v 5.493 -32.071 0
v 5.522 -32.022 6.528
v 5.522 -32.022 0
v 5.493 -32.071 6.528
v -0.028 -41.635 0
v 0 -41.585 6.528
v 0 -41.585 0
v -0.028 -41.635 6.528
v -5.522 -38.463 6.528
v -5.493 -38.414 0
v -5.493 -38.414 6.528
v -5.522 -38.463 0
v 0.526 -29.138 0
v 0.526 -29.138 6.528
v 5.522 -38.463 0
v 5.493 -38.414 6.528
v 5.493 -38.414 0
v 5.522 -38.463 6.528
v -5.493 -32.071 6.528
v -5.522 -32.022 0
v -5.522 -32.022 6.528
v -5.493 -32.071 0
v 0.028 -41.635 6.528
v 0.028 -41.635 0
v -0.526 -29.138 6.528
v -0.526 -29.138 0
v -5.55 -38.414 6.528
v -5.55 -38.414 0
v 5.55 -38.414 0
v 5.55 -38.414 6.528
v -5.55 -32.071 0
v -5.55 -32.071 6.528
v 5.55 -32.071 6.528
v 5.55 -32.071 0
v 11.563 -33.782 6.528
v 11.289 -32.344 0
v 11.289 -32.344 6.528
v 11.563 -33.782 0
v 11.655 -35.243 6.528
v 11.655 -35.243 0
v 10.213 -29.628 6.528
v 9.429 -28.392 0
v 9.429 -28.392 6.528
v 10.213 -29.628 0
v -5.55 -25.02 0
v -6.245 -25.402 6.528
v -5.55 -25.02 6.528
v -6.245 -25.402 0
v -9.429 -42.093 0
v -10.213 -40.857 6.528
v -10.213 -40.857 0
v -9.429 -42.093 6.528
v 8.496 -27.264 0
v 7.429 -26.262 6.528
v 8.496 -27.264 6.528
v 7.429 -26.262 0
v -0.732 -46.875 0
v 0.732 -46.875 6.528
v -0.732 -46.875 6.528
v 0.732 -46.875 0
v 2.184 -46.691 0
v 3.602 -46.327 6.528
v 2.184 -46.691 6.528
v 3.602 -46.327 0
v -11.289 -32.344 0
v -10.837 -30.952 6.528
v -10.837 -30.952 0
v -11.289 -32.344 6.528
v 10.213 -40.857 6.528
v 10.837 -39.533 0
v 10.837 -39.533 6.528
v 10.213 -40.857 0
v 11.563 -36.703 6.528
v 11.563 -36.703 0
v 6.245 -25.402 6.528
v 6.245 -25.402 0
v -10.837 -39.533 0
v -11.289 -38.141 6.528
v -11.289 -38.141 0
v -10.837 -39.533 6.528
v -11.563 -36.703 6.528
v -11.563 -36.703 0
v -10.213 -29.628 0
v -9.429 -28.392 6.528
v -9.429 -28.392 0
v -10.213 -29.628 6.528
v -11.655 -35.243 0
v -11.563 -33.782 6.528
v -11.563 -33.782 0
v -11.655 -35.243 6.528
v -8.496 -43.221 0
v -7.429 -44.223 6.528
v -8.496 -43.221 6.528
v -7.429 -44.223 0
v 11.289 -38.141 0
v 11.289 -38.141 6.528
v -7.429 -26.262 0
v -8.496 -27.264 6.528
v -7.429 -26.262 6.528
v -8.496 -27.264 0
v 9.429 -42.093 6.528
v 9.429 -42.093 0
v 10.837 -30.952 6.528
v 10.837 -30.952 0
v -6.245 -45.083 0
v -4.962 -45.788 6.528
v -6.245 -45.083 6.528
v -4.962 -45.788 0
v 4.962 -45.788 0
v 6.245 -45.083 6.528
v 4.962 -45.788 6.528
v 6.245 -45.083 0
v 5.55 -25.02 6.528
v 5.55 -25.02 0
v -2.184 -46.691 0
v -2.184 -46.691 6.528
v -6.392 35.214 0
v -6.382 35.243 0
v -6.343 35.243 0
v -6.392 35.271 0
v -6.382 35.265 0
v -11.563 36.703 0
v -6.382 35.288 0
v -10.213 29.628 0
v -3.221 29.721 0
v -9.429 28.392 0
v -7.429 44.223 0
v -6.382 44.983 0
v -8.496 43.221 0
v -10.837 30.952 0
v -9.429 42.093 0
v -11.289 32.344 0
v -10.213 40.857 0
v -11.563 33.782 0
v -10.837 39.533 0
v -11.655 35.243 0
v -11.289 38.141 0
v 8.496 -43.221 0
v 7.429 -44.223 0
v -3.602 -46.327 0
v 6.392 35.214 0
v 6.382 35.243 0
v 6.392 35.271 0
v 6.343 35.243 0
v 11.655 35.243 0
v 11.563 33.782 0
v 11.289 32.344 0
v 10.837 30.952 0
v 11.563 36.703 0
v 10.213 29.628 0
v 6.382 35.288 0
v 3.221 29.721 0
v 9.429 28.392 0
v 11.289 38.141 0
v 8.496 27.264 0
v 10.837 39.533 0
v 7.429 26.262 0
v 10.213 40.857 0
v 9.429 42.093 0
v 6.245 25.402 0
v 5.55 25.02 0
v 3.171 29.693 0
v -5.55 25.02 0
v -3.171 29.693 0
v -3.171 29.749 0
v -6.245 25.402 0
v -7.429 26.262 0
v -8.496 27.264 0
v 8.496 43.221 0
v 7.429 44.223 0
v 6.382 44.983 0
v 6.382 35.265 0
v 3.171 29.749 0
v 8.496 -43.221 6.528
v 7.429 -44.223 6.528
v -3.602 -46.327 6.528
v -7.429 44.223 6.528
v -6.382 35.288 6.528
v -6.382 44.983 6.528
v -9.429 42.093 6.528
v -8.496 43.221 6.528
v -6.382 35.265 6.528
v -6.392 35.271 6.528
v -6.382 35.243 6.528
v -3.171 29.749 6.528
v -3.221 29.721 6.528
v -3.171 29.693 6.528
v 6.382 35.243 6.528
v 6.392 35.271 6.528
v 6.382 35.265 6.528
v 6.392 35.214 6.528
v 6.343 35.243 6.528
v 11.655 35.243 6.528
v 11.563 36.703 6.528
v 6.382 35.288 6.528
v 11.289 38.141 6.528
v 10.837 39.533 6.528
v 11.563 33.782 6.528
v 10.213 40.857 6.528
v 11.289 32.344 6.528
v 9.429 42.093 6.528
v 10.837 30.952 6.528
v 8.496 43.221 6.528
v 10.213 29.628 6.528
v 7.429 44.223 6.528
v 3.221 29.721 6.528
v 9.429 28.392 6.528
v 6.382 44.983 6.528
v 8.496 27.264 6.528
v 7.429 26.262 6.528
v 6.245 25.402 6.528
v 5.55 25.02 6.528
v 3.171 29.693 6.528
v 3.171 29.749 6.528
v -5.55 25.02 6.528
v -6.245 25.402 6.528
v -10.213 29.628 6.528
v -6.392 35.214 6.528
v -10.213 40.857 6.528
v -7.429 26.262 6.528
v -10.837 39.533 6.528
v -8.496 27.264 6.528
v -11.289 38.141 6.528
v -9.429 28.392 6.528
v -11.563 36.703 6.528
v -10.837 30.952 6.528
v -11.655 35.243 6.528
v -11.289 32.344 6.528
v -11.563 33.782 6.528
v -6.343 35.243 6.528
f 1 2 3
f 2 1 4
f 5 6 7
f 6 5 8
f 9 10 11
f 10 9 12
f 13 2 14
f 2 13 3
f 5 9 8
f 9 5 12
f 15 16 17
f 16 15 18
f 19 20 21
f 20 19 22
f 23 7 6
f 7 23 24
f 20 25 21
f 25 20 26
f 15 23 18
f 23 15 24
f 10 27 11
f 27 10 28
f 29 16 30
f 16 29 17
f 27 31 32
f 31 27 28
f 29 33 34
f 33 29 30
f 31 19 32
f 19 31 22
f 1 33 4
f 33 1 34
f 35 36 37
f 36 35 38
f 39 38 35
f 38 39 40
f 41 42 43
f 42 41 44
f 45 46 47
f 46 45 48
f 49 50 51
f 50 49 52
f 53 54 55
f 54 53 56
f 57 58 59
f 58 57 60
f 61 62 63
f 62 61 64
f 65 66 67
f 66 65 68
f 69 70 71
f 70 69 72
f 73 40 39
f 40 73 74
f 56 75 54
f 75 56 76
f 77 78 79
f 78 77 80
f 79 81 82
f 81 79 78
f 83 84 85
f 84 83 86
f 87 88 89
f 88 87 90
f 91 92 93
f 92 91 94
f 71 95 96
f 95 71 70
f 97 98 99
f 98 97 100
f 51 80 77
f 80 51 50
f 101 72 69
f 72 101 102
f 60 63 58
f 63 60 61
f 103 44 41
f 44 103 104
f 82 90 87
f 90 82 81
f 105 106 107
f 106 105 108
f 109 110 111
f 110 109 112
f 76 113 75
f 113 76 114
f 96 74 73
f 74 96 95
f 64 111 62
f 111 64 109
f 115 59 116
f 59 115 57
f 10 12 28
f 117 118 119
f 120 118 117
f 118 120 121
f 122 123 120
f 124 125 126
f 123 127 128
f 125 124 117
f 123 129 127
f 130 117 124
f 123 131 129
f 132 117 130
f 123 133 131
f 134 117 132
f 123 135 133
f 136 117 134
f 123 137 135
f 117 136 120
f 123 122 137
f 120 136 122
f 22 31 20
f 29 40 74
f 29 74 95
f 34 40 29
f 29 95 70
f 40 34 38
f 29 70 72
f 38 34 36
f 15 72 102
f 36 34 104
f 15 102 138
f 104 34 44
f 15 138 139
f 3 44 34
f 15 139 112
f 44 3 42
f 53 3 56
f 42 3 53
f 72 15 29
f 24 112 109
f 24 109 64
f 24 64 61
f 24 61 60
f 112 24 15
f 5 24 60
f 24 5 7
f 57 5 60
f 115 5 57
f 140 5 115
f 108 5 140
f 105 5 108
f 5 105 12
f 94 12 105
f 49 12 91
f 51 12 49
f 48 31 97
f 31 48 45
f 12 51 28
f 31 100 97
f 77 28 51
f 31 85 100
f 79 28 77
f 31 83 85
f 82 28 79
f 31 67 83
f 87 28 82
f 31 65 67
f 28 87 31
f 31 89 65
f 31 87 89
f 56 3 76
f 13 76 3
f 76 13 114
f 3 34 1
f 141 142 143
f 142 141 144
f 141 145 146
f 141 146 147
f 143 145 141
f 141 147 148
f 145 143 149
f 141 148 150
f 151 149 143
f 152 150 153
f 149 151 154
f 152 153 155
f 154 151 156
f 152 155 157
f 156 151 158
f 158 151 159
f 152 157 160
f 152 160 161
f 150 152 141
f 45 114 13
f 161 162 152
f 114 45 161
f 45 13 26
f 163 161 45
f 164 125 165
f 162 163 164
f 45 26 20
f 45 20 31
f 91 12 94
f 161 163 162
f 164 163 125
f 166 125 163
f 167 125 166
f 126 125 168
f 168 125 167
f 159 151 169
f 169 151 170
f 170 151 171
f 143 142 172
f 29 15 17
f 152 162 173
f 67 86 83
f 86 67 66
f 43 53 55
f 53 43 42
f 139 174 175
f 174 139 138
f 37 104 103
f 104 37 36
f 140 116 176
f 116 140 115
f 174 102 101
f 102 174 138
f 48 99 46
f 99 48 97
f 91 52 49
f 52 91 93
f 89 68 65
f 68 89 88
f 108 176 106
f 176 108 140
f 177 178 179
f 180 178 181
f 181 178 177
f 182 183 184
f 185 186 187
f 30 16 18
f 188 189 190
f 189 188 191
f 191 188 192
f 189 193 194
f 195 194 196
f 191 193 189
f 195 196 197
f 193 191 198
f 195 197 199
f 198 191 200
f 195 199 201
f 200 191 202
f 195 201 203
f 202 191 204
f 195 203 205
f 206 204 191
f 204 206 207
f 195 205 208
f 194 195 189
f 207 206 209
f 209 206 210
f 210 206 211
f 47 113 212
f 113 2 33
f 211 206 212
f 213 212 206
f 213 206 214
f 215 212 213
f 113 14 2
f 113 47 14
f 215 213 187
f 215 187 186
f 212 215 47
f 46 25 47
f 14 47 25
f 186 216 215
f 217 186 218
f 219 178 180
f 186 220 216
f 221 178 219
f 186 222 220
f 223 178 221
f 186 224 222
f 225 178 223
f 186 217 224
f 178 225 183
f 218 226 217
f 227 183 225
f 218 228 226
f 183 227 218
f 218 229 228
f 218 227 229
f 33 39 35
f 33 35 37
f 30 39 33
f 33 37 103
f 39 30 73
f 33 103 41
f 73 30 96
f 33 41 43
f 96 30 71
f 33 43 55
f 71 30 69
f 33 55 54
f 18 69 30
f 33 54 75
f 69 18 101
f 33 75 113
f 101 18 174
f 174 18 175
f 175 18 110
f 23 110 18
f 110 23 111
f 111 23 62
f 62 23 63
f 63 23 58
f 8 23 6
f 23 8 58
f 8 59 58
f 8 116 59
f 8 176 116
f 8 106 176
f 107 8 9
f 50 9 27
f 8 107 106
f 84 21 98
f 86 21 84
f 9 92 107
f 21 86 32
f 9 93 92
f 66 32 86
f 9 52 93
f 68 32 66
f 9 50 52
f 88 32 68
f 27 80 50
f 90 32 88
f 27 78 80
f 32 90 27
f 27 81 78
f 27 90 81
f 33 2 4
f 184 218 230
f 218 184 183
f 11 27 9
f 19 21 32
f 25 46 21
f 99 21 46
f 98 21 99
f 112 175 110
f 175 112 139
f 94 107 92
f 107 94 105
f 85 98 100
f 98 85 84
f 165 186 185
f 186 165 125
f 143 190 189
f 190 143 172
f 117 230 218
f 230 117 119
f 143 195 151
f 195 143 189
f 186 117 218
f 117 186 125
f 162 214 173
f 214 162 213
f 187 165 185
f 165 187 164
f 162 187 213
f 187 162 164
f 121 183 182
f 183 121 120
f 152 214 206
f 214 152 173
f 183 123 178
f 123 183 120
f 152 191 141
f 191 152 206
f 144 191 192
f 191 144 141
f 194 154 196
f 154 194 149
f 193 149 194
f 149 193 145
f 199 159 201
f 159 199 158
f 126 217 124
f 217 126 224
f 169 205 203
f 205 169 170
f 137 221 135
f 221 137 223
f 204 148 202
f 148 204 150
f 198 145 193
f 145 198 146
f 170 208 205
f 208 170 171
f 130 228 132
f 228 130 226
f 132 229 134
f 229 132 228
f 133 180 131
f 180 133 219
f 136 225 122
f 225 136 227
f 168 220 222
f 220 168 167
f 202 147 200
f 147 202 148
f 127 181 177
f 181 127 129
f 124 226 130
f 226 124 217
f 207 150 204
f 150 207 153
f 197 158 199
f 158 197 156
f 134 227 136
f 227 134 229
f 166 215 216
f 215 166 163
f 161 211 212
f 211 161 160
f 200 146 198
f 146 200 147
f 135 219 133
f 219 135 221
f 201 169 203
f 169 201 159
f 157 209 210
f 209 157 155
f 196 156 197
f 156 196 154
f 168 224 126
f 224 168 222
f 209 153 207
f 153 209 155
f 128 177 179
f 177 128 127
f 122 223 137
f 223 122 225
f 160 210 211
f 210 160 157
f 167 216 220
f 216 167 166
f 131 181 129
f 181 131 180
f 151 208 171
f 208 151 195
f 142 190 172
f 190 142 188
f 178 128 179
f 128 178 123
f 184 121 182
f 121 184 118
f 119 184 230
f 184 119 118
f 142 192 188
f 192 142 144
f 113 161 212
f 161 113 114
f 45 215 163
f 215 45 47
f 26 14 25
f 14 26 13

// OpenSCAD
// https://www.thingiverse.com/thing:4395626/

use <MCAD/shapes.scad>		// For octagon

$fn = 50;					// So the cylinders are smooth

//nut_diameter = 5.6;			// My M3 nut measured ~5.4, I added a fudge factor
//nut_thickness = 2.31;

// [antocuni] my 1/4" photographic nut
// NOTE: the diameter of the hexagon() is the d of the inscribed circle
// (i.e. measured "face to face", compare to the outscribed circle which is
// vertex-to-vertex)
nut_diameter = 10.90 + 0.2; // add some tolerance
nut_thickness = 5.44;



// Calculate some nice values

wrench_thickness = 1.2 * nut_thickness;
wrench_length = 5.25 * nut_diameter;
wrench_head_extra_d = 1.1 * nut_diameter;	// If your wrench is big, you
										// probably just want this to be 10

// Something to make wrench heads for us

module wrench_head(thickness, nut_d, head_extra, open_ended) {
	difference() {
		translate([0, 0, -thickness / 2]) {
			cylinder(h = thickness, r = (nut_d + head_extra) / 2);
		}

		if (open_ended) {
                hexagon(nut_d, thickness * 1.1);
        }
        else {
           rotate(30) {
 			hexagon(nut_d, thickness * 1.1);
            }
        }

        // XXX the following is wrong: we should use some formula to compute
        // the diameter of the outscribed circle from the inscribed one
        out_d = nut_d * 1.15;
		translate([-out_d/2, 0, -thickness*1.1 / 2]) {
			if (open_ended) {
                cube([out_d, nut_d+head_extra, thickness * 1.1]);
			}
        }
	}
}

// Put us flat on the bed

translate([0, 0, wrench_thickness / 2]) {

	// The handle

	box(nut_diameter, wrench_length, wrench_thickness);

	// Make the closed head

	translate([0, -((wrench_length + wrench_head_extra_d) / 2), 0]) {
		wrench_head(wrench_thickness, nut_diameter, wrench_head_extra_d, false);
	}

	// And the open head

	translate([0, (wrench_length + wrench_head_extra_d) / 2, 0]) {
		wrench_head(wrench_thickness, nut_diameter, wrench_head_extra_d, true);
	}
}
